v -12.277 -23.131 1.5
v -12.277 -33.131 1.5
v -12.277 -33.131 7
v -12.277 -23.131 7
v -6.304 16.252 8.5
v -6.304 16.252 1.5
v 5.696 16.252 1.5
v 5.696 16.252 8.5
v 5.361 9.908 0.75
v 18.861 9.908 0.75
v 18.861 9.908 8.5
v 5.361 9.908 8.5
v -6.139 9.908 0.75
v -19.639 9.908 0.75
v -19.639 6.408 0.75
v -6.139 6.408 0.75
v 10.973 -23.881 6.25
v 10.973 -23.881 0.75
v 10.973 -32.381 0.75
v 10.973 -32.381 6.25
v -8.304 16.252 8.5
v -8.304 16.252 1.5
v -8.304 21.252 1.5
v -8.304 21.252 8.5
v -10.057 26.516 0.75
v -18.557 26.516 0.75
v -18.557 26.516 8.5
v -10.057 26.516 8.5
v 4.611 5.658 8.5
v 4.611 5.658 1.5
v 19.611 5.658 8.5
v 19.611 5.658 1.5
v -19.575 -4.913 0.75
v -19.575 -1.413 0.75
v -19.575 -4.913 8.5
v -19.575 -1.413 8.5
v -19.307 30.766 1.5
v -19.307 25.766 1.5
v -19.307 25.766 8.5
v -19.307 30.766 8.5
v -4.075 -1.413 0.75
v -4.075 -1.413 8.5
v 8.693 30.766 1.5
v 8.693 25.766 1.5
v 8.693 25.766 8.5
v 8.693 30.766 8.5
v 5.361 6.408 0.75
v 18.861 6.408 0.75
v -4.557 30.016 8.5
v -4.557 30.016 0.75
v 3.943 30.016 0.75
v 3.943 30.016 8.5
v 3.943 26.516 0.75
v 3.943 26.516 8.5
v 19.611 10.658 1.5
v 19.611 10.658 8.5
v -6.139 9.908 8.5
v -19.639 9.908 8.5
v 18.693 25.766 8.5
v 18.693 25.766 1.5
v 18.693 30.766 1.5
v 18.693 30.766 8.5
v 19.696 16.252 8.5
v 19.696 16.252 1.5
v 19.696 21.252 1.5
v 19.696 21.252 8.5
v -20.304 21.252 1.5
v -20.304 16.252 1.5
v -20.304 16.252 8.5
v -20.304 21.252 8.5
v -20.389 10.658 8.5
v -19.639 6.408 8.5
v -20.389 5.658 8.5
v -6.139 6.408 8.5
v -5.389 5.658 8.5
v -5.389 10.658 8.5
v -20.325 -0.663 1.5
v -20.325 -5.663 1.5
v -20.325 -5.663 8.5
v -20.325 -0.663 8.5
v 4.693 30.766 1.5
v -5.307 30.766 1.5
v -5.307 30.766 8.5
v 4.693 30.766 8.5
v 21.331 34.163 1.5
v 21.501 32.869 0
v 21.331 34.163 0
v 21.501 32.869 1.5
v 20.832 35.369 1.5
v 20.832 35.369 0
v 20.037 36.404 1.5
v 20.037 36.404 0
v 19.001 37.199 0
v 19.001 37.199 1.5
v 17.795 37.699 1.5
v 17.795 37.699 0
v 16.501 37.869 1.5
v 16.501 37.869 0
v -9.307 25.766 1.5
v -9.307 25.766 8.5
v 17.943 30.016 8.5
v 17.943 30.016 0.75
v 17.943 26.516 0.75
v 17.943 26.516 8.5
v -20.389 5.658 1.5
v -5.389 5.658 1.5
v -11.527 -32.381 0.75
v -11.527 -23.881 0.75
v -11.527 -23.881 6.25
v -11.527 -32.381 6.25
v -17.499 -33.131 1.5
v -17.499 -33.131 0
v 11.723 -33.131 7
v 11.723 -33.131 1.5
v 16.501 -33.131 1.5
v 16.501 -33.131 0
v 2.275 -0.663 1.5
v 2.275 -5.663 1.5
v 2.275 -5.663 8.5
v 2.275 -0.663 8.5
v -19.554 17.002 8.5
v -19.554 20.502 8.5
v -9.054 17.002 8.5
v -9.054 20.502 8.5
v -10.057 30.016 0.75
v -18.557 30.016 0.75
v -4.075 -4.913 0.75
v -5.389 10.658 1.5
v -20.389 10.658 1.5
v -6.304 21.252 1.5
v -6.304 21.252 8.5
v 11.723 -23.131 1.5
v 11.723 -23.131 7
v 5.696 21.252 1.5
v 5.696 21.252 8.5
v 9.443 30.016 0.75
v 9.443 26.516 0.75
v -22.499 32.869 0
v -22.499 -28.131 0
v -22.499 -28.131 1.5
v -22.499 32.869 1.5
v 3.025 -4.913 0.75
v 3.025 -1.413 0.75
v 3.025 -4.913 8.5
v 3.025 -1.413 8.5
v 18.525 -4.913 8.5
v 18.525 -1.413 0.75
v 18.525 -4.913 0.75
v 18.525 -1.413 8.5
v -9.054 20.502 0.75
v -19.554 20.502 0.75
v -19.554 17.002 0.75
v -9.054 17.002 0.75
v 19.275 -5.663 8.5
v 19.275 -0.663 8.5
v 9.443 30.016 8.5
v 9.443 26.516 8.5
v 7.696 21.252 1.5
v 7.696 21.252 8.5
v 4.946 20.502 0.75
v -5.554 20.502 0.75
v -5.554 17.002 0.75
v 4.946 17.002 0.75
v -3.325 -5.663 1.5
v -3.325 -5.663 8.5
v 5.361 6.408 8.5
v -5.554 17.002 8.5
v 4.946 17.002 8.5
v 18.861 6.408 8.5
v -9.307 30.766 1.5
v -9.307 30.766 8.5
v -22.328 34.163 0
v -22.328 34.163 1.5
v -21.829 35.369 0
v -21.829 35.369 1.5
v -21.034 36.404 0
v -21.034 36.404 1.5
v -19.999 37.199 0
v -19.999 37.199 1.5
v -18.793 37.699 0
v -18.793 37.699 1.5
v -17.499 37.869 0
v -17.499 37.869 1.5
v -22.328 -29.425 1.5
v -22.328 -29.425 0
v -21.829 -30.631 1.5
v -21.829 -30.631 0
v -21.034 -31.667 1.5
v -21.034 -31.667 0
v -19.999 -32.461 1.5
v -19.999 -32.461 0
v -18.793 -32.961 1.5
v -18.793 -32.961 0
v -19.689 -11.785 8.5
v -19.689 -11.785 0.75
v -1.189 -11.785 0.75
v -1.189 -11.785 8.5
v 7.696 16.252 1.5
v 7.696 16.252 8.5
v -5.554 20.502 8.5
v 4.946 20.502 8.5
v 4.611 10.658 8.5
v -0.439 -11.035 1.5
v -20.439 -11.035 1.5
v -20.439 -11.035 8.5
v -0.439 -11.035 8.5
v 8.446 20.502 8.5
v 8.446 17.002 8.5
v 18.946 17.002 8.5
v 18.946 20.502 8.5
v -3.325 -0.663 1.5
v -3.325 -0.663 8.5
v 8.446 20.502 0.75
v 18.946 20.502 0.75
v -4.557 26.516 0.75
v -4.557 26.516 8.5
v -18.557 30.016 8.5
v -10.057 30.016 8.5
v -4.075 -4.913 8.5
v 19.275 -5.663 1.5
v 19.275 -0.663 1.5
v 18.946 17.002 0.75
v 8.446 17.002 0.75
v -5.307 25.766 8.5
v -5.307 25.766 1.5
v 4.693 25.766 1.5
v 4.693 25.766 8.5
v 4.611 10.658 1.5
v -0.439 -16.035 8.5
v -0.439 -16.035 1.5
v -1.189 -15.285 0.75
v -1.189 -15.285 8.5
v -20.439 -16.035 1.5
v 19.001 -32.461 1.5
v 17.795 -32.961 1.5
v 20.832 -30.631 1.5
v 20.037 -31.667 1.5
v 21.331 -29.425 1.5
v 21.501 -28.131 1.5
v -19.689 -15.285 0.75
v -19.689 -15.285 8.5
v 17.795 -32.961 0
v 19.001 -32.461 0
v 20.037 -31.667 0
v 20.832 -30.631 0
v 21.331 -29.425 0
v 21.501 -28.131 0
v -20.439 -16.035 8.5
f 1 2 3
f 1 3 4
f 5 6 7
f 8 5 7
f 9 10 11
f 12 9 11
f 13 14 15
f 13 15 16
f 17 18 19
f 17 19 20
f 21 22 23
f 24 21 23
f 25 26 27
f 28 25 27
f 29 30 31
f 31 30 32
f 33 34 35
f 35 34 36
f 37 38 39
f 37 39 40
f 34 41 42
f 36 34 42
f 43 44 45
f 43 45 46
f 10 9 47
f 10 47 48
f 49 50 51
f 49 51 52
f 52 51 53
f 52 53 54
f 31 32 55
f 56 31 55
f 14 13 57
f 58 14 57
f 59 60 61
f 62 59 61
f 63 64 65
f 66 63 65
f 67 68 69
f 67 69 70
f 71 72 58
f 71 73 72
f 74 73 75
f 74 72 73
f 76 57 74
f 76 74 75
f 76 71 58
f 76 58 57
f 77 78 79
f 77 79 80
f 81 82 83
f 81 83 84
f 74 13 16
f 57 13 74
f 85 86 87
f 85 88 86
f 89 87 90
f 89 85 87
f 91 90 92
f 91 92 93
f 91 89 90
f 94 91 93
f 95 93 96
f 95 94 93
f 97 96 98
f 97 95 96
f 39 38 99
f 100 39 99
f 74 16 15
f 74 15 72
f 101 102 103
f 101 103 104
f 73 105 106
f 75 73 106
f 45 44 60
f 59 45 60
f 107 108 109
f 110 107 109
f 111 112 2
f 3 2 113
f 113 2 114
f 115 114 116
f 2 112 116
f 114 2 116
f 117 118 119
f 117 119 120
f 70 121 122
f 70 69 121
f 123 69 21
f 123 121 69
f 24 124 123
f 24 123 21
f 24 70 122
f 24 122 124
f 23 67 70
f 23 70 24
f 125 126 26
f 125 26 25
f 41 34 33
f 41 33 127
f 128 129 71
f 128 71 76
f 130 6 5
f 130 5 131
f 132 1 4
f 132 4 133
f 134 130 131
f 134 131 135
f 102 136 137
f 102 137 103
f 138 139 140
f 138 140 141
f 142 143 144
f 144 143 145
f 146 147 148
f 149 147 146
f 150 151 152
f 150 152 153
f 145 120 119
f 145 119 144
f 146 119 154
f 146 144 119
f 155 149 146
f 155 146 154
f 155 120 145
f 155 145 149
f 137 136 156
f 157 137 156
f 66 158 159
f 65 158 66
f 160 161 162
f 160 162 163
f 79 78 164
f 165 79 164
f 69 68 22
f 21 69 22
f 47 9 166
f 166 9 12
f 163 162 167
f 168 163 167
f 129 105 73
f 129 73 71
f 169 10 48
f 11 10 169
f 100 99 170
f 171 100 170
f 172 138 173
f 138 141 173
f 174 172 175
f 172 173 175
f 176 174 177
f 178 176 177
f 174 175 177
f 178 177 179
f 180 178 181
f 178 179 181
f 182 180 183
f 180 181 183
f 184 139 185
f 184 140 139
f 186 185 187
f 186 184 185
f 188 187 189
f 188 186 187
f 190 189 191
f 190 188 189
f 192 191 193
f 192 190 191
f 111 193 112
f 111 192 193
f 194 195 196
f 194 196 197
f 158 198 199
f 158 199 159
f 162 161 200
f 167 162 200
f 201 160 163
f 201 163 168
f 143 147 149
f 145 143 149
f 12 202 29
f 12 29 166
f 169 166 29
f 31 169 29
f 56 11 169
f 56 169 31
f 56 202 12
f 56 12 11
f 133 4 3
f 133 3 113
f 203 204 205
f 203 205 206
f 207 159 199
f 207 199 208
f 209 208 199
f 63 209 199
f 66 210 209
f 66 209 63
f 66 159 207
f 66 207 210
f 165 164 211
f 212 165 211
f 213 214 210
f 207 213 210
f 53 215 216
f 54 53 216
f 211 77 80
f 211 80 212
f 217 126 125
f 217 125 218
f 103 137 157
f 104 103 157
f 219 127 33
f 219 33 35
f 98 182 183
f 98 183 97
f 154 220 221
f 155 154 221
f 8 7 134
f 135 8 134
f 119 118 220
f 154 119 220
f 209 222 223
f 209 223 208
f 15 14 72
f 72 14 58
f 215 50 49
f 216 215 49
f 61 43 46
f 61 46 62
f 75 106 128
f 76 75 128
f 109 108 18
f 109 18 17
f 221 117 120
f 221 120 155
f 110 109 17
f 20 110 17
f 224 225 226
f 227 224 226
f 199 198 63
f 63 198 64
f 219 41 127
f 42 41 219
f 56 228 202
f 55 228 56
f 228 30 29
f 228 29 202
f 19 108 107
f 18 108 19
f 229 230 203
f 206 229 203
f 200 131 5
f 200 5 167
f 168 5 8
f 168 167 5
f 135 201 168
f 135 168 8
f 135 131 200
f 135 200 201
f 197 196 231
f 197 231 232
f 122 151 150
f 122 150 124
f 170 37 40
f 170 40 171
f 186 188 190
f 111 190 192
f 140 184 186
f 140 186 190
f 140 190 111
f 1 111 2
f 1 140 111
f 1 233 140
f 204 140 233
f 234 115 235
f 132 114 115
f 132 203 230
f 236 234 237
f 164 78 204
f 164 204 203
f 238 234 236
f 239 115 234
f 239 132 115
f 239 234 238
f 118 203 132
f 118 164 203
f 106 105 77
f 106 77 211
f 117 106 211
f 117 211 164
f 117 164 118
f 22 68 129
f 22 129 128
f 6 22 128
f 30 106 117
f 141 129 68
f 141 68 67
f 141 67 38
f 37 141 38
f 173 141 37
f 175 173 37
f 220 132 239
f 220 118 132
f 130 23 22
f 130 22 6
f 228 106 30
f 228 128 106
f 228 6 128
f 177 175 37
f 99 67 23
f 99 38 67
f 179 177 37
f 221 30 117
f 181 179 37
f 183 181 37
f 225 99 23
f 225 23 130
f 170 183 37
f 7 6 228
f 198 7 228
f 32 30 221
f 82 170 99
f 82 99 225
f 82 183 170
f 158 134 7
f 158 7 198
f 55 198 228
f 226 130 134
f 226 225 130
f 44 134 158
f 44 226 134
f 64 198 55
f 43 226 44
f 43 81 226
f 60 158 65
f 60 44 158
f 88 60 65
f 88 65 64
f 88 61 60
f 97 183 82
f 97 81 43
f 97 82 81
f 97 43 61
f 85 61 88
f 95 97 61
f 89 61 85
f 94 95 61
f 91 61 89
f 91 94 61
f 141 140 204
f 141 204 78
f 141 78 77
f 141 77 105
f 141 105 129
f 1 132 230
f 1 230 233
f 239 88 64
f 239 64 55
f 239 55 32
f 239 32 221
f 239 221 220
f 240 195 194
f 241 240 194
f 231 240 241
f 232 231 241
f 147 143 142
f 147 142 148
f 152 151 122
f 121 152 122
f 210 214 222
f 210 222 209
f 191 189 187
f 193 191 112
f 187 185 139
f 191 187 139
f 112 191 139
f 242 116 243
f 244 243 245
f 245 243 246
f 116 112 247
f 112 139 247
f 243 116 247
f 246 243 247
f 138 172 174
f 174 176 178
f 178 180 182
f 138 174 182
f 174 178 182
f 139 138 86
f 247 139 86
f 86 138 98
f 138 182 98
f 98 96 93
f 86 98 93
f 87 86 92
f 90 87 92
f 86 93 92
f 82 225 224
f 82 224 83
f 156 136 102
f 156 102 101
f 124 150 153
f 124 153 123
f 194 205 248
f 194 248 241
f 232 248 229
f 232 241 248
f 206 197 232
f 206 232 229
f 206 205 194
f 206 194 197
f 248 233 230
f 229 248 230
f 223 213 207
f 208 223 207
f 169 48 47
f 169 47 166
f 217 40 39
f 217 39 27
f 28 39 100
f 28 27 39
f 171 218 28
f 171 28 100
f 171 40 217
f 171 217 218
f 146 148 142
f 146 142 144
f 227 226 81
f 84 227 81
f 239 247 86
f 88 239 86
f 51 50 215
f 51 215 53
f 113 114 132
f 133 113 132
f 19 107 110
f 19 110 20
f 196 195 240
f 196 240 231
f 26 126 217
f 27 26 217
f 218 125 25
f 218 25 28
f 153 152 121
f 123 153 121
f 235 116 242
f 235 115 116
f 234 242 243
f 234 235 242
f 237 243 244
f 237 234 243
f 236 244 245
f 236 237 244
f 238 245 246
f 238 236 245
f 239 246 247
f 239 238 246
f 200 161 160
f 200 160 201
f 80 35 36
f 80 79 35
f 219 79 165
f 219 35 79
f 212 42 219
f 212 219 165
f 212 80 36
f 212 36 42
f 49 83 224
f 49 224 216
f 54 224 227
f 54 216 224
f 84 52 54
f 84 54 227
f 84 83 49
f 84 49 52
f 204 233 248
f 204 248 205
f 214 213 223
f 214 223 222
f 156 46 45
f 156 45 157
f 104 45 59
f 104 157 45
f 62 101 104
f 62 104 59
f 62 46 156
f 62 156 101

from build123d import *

# Parameters (mm, degrees)
F0_W         = 44
F0_H         = 71
F1_DEPTH     = 1.5
F2_R         = 5
F3_W         = 24
F3_H         = 10
F4_DEPTH     = 5.5
F5_W         = 10
F5_H         = 5
F5_W_2       = 12
F5_W_3       = 15
F5_W_4       = 17
F5_W_5       = 20
F6_DEPTH     = 7
F7_T         = 0.75
F7_T3_DEPTH  = 11.5
F7_T5_DEPTH  = 25.5
F7_T7_DEPTH  = 6.5
F7_T9_DEPTH  = 21.5
F7_T11_DEPTH = 6.5
F7_T13_DEPTH = 18.5
F7_T15_DEPTH = 18.5
F7_T17_DEPTH = 6.5
F7_T19_DEPTH = 16.5
F7_T21_DEPTH = 6.5
F7_T23_DEPTH = 13.5
F7_T25_DEPTH = 11.5
F7_T27_DEPTH = 6.5
F7_T29_DEPTH = 13.5
F7_T31_DEPTH = 16.5
F7_T33_DEPTH = 13.5
F7_T35_DEPTH = 11.5
F7_T37_DEPTH = 11.5


# Not quite as in the source:
# - a shell that OpenCascade refuses in one call is made with other operations: the cavity is built on its own and cut out


with BuildPart() as f1:
    # F0 (on Top) → F1 (new body)
    with BuildSketch(Plane.XY):
        with Locations((-0.4986094981, 2.3689430654)):
            Rectangle(F0_W, F0_H)
    extrude(amount=F1_DEPTH)

    # F2
    f2_edges = [f1.edges().sort_by_distance(p)[0] for p in [
        (-22.498609, 37.868943, 0.75),
        (-22.498609, -33.131057, 0.75),
        (21.501391, -33.131057, 0.75),
        (21.501391, 37.868943, 0.75),
    ]]
    fillet(f2_edges, radius=F2_R)

    # F3 (on face) → F4 (join)
    with BuildSketch(Plane.XY.offset(1.5)):
        with Locations((-0.276770547, -28.1310569346)):
            Rectangle(F3_W, F3_H)
    extrude(amount=F4_DEPTH)

    # F5 (on face) → F6 (join)
    with BuildSketch(Plane.XY.offset(1.5)):
        with Locations((-14.3074645847, 28.2659181952)):
            Rectangle(F5_W, F5_H)
        with Locations((-0.3074645847, 28.2659181952)):
            Rectangle(F5_W, F5_H)
        with Locations((13.6925354153, 28.2659181952)):
            Rectangle(F5_W, F5_H)
        with Locations((-14.3036200255, 18.7520762533)):
            Rectangle(F5_W_2, F5_H)
        with Locations((-0.3036200255, 18.7520762533)):
            Rectangle(F5_W_2, F5_H)
        with Locations((-12.8887149692, 8.1576090865)):
            Rectangle(F5_W_3, F5_H)
        with Locations((-11.8254707158, -3.1629925966)):
            Rectangle(F5_W_4, F5_H)
        with Locations((-10.4394350369, -13.5349402577)):
            Rectangle(F5_W_5, F5_H)
        with Locations((13.6963799745, 18.7520762533)):
            Rectangle(F5_W_2, F5_H)
        with Locations((12.1112850308, 8.1576090865)):
            Rectangle(F5_W_3, F5_H)
        with Locations((10.7745292842, -3.1629925966)):
            Rectangle(F5_W_4, F5_H)
    extrude(amount=F6_DEPTH)

    # F7: shell of thickness 0.75, made by hand


with BuildPart() as f7_core1:
    # F7_t2: copy of F1
    add(f1.part)

    # the walls: a layer under each face that stays
    f7_faces = [f7_core1.faces().sort_by_distance(p)[0] for p in [
        (-0.4986094981, -33.1310569346, 3.5),
        (-0.4986094981, 2.3689430654, 0),
        (-21.0341434041, -31.6665908405, 0.75),
        (-0.4986094981, 2.3689430654, 1.5),
        (-12.276770547, -28.1310569346, 4.25),
        (-0.276770547, -28.1310569346, 7),
        (11.723229453, -28.1310569346, 4.25),
        (20.0369244078, -31.6665908405, 0.75),
        (-22.4986094981, 2.3689430654, 0.75),
        (21.5013905019, 2.3689430654, 0.75),
        (-21.0341434041, 36.4044769713, 0.75),
        (20.0369244078, 36.4044769713, 0.75),
        (-0.4986094981, 37.8689430654, 0.75),
        (-0.276770547, -23.1310569346, 4.25),
        (-20.4394350369, -13.5349402577, 5),
        (-10.4394350369, -16.0349402577, 5),
        (-0.4394350369, -13.5349402577, 5),
        (-10.4394350369, -11.0349402577, 5),
        (-3.3254707158, -3.1629925966, 5),
        (-11.8254707158, -0.6629925966, 5),
        (-20.3254707158, -3.1629925966, 5),
        (-11.8254707158, -5.6629925966, 5),
        (19.2745292842, -3.1629925966, 5),
        (10.7745292842, -0.6629925966, 5),
        (2.2745292842, -3.1629925966, 5),
        (10.7745292842, -5.6629925966, 5),
        (-20.3887149692, 8.1576090865, 5),
        (-12.8887149692, 5.6576090865, 5),
        (-5.3887149692, 8.1576090865, 5),
        (-12.8887149692, 10.6576090865, 5),
        (-20.3036200255, 18.7520762533, 5),
        (-14.3036200255, 16.2520762533, 5),
        (-8.3036200255, 18.7520762533, 5),
        (-14.3036200255, 21.2520762533, 5),
        (-14.3074645847, 30.7659181952, 5),
        (-19.3074645847, 28.2659181952, 5),
        (-14.3074645847, 25.7659181952, 5),
        (-9.3074645847, 28.2659181952, 5),
        (-0.3036200255, 16.2520762533, 5),
        (5.6963799745, 18.7520762533, 5),
        (-0.3036200255, 21.2520762533, 5),
        (-6.3036200255, 18.7520762533, 5),
        (19.6112850308, 8.1576090865, 5),
        (12.1112850308, 10.6576090865, 5),
        (4.6112850308, 8.1576090865, 5),
        (12.1112850308, 5.6576090865, 5),
        (7.6963799745, 18.7520762533, 5),
        (13.6963799745, 16.2520762533, 5),
        (19.6963799745, 18.7520762533, 5),
        (13.6963799745, 21.2520762533, 5),
        (-0.3074645847, 25.7659181952, 5),
        (4.6925354153, 28.2659181952, 5),
        (-0.3074645847, 30.7659181952, 5),
        (-5.3074645847, 28.2659181952, 5),
        (13.6925354153, 30.7659181952, 5),
        (8.6925354153, 28.2659181952, 5),
        (13.6925354153, 25.7659181952, 5),
        (18.6925354153, 28.2659181952, 5),
    ]]
    thicken(f7_faces, amount=-F7_T, mode=Mode.SUBTRACT)

    # F7_s4 → F7_t3 (cut)
    with BuildSketch(Plane.XZ.offset(22.3810569346)):
        Polygon((-12.284270547, 1.5075), (-12.276770547, 0.75), (-11.526770547, 0.75), (-11.526770547, 1.5), align=None)
        Polygon((11.730729453, 1.5075), (11.723229453, 0.75), (10.973229453, 0.75), (10.973229453, 1.5), align=None)
    extrude(amount=F7_T3_DEPTH, mode=Mode.SUBTRACT)

    # F7_s6 → F7_t5 (cut)
    with BuildSketch(Plane.YZ.offset(-13.026770547)):
        Polygon((-23.1235569346, 1.5075), (-23.1310569346, 0.75), (-23.8810569346, 0.75), (-23.8810569346, 1.5), align=None)
    extrude(amount=F7_T5_DEPTH, mode=Mode.SUBTRACT)

    # F7_s8 → F7_t7 (cut)
    with BuildSketch(Plane.XZ.offset(10.2849402577)):
        Polygon((-20.4469350369, 1.5075), (-20.4394350369, 0.75), (-19.6894350369, 0.75), (-19.6894350369, 1.5), align=None)
        Polygon((-0.4319350369, 1.5075), (-0.4394350369, 0.75), (-1.1894350369, 0.75), (-1.1894350369, 1.5), align=None)
    extrude(amount=F7_T7_DEPTH, mode=Mode.SUBTRACT)

    # F7_s10 → F7_t9 (cut)
    with BuildSketch(Plane.YZ.offset(-21.1894350369)):
        Polygon((-16.0424402577, 1.5075), (-16.0349402577, 0.75), (-15.2849402577, 0.75), (-15.2849402577, 1.5), align=None)
        Polygon((-11.0274402577, 1.5075), (-11.0349402577, 0.75), (-11.7849402577, 0.75), (-11.7849402577, 1.5), align=None)
    extrude(amount=F7_T9_DEPTH, mode=Mode.SUBTRACT)

    # F7_s12 → F7_t11 (cut)
    with BuildSketch(Plane.XZ.offset(-0.0870074034)):
        Polygon((-3.3179707158, 1.5075), (-3.3254707158, 0.75), (-4.0754707158, 0.75), (-4.0754707158, 1.5), align=None)
        Polygon((-20.3329707158, 1.5075), (-20.3254707158, 0.75), (-19.5754707158, 0.75), (-19.5754707158, 1.5), align=None)
        Polygon((19.2820292842, 1.5075), (19.2745292842, 0.75), (18.5245292842, 0.75), (18.5245292842, 1.5), align=None)
        Polygon((2.2670292842, 1.5075), (2.2745292842, 0.75), (3.0245292842, 0.75), (3.0245292842, 1.5), align=None)
    extrude(amount=F7_T11_DEPTH, mode=Mode.SUBTRACT)

    # F7_s14 → F7_t13 (cut)
    with BuildSketch(Plane.YZ.offset(-21.0754707158)):
        Polygon((-0.6554925966, 1.5075), (-0.6629925966, 0.75), (-1.4129925966, 0.75), (-1.4129925966, 1.5), align=None)
        Polygon((-5.6704925966, 1.5075), (-5.6629925966, 0.75), (-4.9129925966, 0.75), (-4.9129925966, 1.5), align=None)
    extrude(amount=F7_T13_DEPTH, mode=Mode.SUBTRACT)

    # F7_s16 → F7_t15 (cut)
    with BuildSketch(Plane.YZ.offset(1.5245292842)):
        Polygon((-0.6554925966, 1.5075), (-0.6629925966, 0.75), (-1.4129925966, 0.75), (-1.4129925966, 1.5), align=None)
        Polygon((-5.6704925966, 1.5075), (-5.6629925966, 0.75), (-4.9129925966, 0.75), (-4.9129925966, 1.5), align=None)
    extrude(amount=F7_T15_DEPTH, mode=Mode.SUBTRACT)

    # F7_s18 → F7_t17 (cut)
    with BuildSketch(Plane.XZ.offset(-11.4076090865)):
        Polygon((-20.3962149692, 1.5075), (-20.3887149692, 0.75), (-19.6387149692, 0.75), (-19.6387149692, 1.5), align=None)
        Polygon((-5.3812149692, 1.5075), (-5.3887149692, 0.75), (-6.1387149692, 0.75), (-6.1387149692, 1.5), align=None)
        Polygon((19.6187850308, 1.5075), (19.6112850308, 0.75), (18.8612850308, 0.75), (18.8612850308, 1.5), align=None)
        Polygon((4.6037850308, 1.5075), (4.6112850308, 0.75), (5.3612850308, 0.75), (5.3612850308, 1.5), align=None)
    extrude(amount=F7_T17_DEPTH, mode=Mode.SUBTRACT)

    # F7_s20 → F7_t19 (cut)
    with BuildSketch(Plane.YZ.offset(-21.1387149692)):
        Polygon((5.6501090865, 1.5075), (5.6576090865, 0.75), (6.4076090865, 0.75), (6.4076090865, 1.5), align=None)
        Polygon((10.6651090865, 1.5075), (10.6576090865, 0.75), (9.9076090865, 0.75), (9.9076090865, 1.5), align=None)
    extrude(amount=F7_T19_DEPTH, mode=Mode.SUBTRACT)

    # F7_s22 → F7_t21 (cut)
    with BuildSketch(Plane.XZ.offset(-22.0020762533)):
        Polygon((-20.3111200255, 1.5075), (-20.3036200255, 0.75), (-19.5536200255, 0.75), (-19.5536200255, 1.5), align=None)
        Polygon((-8.2961200255, 1.5075), (-8.3036200255, 0.75), (-9.0536200255, 0.75), (-9.0536200255, 1.5), align=None)
        Polygon((5.7038799745, 1.5075), (5.6963799745, 0.75), (4.9463799745, 0.75), (4.9463799745, 1.5), align=None)
        Polygon((-6.3111200255, 1.5075), (-6.3036200255, 0.75), (-5.5536200255, 0.75), (-5.5536200255, 1.5), align=None)
        Polygon((7.6888799745, 1.5075), (7.6963799745, 0.75), (8.4463799745, 0.75), (8.4463799745, 1.5), align=None)
        Polygon((19.7038799745, 1.5075), (19.6963799745, 0.75), (18.9463799745, 0.75), (18.9463799745, 1.5), align=None)
    extrude(amount=F7_T21_DEPTH, mode=Mode.SUBTRACT)

    # F7_s24 → F7_t23 (cut)
    with BuildSketch(Plane.YZ.offset(-21.0536200255)):
        Polygon((16.2445762533, 1.5075), (16.2520762533, 0.75), (17.0020762533, 0.75), (17.0020762533, 1.5), align=None)
        Polygon((21.2595762533, 1.5075), (21.2520762533, 0.75), (20.5020762533, 0.75), (20.5020762533, 1.5), align=None)
    extrude(amount=F7_T23_DEPTH, mode=Mode.SUBTRACT)

    # F7_s26 → F7_t25 (cut)
    with BuildSketch(Plane.YZ.offset(-20.0574645847)):
        Polygon((30.7734181952, 1.5075), (30.7659181952, 0.75), (30.0159181952, 0.75), (30.0159181952, 1.5), align=None)
        Polygon((25.7584181952, 1.5075), (25.7659181952, 0.75), (26.5159181952, 0.75), (26.5159181952, 1.5), align=None)
    extrude(amount=F7_T25_DEPTH, mode=Mode.SUBTRACT)

    # F7_s28 → F7_t27 (cut)
    with BuildSketch(Plane.XZ.offset(-31.5159181952)):
        Polygon((-19.3149645847, 1.5075), (-19.3074645847, 0.75), (-18.5574645847, 0.75), (-18.5574645847, 1.5), align=None)
        Polygon((-9.2999645847, 1.5075), (-9.3074645847, 0.75), (-10.0574645847, 0.75), (-10.0574645847, 1.5), align=None)
        Polygon((4.7000354153, 1.5075), (4.6925354153, 0.75), (3.9425354153, 0.75), (3.9425354153, 1.5), align=None)
        Polygon((-5.3149645847, 1.5075), (-5.3074645847, 0.75), (-4.5574645847, 0.75), (-4.5574645847, 1.5), align=None)
        Polygon((8.6850354153, 1.5075), (8.6925354153, 0.75), (9.4425354153, 0.75), (9.4425354153, 1.5), align=None)
        Polygon((18.7000354153, 1.5075), (18.6925354153, 0.75), (17.9425354153, 0.75), (17.9425354153, 1.5), align=None)
    extrude(amount=F7_T27_DEPTH, mode=Mode.SUBTRACT)

    # F7_s30 → F7_t29 (cut)
    with BuildSketch(Plane.YZ.offset(-7.0536200255)):
        Polygon((16.2445762533, 1.5075), (16.2520762533, 0.75), (17.0020762533, 0.75), (17.0020762533, 1.5), align=None)
        Polygon((21.2595762533, 1.5075), (21.2520762533, 0.75), (20.5020762533, 0.75), (20.5020762533, 1.5), align=None)
    extrude(amount=F7_T29_DEPTH, mode=Mode.SUBTRACT)

    # F7_s32 → F7_t31 (cut)
    with BuildSketch(Plane.YZ.offset(3.8612850308)):
        Polygon((10.6651090865, 1.5075), (10.6576090865, 0.75), (9.9076090865, 0.75), (9.9076090865, 1.5), align=None)
        Polygon((5.6501090865, 1.5075), (5.6576090865, 0.75), (6.4076090865, 0.75), (6.4076090865, 1.5), align=None)
    extrude(amount=F7_T31_DEPTH, mode=Mode.SUBTRACT)

    # F7_s34 → F7_t33 (cut)
    with BuildSketch(Plane.YZ.offset(6.9463799745)):
        Polygon((16.2445762533, 1.5075), (16.2520762533, 0.75), (17.0020762533, 0.75), (17.0020762533, 1.5), align=None)
        Polygon((21.2595762533, 1.5075), (21.2520762533, 0.75), (20.5020762533, 0.75), (20.5020762533, 1.5), align=None)
    extrude(amount=F7_T33_DEPTH, mode=Mode.SUBTRACT)

    # F7_s36 → F7_t35 (cut)
    with BuildSketch(Plane.YZ.offset(-6.0574645847)):
        Polygon((25.7584181952, 1.5075), (25.7659181952, 0.75), (26.5159181952, 0.75), (26.5159181952, 1.5), align=None)
        Polygon((30.7734181952, 1.5075), (30.7659181952, 0.75), (30.0159181952, 0.75), (30.0159181952, 1.5), align=None)
    extrude(amount=F7_T35_DEPTH, mode=Mode.SUBTRACT)

    # F7_s38 → F7_t37 (cut)
    with BuildSketch(Plane.YZ.offset(7.9425354153)):
        Polygon((30.7734181952, 1.5075), (30.7659181952, 0.75), (30.0159181952, 0.75), (30.0159181952, 1.5), align=None)
        Polygon((25.7584181952, 1.5075), (25.7659181952, 0.75), (26.5159181952, 0.75), (26.5159181952, 1.5), align=None)
    extrude(amount=F7_T37_DEPTH, mode=Mode.SUBTRACT)


with BuildPart() as f1_1:
    add(f1.part)

    # what is left inside the walls is the cavity
    f7_cavity = [f7_core1.part.solids().sort_by_distance(p)[0] for p in [
        (-0.276771, -29.547724, 6.2425),
        (-7.356102, -15.27744, 4.625),
        (-9.242137, -1.420493, 4.625),
        (13.357863, -1.420493, 4.625),
        (-10.638715, 9.900109, 4.625),
        (-12.55362, 17.009576, 4.625),
        (-12.890798, 30.008418, 4.625),
        (1.44638, 17.009576, 4.625),
        (14.361285, 6.415109, 4.625),
        (15.44638, 17.009576, 4.625),
        (1.109202, 26.523418, 4.625),
        (15.109202, 30.008418, 4.625),
    ]]
    add(f7_cavity, mode=Mode.SUBTRACT)


solid = f1_1.part
